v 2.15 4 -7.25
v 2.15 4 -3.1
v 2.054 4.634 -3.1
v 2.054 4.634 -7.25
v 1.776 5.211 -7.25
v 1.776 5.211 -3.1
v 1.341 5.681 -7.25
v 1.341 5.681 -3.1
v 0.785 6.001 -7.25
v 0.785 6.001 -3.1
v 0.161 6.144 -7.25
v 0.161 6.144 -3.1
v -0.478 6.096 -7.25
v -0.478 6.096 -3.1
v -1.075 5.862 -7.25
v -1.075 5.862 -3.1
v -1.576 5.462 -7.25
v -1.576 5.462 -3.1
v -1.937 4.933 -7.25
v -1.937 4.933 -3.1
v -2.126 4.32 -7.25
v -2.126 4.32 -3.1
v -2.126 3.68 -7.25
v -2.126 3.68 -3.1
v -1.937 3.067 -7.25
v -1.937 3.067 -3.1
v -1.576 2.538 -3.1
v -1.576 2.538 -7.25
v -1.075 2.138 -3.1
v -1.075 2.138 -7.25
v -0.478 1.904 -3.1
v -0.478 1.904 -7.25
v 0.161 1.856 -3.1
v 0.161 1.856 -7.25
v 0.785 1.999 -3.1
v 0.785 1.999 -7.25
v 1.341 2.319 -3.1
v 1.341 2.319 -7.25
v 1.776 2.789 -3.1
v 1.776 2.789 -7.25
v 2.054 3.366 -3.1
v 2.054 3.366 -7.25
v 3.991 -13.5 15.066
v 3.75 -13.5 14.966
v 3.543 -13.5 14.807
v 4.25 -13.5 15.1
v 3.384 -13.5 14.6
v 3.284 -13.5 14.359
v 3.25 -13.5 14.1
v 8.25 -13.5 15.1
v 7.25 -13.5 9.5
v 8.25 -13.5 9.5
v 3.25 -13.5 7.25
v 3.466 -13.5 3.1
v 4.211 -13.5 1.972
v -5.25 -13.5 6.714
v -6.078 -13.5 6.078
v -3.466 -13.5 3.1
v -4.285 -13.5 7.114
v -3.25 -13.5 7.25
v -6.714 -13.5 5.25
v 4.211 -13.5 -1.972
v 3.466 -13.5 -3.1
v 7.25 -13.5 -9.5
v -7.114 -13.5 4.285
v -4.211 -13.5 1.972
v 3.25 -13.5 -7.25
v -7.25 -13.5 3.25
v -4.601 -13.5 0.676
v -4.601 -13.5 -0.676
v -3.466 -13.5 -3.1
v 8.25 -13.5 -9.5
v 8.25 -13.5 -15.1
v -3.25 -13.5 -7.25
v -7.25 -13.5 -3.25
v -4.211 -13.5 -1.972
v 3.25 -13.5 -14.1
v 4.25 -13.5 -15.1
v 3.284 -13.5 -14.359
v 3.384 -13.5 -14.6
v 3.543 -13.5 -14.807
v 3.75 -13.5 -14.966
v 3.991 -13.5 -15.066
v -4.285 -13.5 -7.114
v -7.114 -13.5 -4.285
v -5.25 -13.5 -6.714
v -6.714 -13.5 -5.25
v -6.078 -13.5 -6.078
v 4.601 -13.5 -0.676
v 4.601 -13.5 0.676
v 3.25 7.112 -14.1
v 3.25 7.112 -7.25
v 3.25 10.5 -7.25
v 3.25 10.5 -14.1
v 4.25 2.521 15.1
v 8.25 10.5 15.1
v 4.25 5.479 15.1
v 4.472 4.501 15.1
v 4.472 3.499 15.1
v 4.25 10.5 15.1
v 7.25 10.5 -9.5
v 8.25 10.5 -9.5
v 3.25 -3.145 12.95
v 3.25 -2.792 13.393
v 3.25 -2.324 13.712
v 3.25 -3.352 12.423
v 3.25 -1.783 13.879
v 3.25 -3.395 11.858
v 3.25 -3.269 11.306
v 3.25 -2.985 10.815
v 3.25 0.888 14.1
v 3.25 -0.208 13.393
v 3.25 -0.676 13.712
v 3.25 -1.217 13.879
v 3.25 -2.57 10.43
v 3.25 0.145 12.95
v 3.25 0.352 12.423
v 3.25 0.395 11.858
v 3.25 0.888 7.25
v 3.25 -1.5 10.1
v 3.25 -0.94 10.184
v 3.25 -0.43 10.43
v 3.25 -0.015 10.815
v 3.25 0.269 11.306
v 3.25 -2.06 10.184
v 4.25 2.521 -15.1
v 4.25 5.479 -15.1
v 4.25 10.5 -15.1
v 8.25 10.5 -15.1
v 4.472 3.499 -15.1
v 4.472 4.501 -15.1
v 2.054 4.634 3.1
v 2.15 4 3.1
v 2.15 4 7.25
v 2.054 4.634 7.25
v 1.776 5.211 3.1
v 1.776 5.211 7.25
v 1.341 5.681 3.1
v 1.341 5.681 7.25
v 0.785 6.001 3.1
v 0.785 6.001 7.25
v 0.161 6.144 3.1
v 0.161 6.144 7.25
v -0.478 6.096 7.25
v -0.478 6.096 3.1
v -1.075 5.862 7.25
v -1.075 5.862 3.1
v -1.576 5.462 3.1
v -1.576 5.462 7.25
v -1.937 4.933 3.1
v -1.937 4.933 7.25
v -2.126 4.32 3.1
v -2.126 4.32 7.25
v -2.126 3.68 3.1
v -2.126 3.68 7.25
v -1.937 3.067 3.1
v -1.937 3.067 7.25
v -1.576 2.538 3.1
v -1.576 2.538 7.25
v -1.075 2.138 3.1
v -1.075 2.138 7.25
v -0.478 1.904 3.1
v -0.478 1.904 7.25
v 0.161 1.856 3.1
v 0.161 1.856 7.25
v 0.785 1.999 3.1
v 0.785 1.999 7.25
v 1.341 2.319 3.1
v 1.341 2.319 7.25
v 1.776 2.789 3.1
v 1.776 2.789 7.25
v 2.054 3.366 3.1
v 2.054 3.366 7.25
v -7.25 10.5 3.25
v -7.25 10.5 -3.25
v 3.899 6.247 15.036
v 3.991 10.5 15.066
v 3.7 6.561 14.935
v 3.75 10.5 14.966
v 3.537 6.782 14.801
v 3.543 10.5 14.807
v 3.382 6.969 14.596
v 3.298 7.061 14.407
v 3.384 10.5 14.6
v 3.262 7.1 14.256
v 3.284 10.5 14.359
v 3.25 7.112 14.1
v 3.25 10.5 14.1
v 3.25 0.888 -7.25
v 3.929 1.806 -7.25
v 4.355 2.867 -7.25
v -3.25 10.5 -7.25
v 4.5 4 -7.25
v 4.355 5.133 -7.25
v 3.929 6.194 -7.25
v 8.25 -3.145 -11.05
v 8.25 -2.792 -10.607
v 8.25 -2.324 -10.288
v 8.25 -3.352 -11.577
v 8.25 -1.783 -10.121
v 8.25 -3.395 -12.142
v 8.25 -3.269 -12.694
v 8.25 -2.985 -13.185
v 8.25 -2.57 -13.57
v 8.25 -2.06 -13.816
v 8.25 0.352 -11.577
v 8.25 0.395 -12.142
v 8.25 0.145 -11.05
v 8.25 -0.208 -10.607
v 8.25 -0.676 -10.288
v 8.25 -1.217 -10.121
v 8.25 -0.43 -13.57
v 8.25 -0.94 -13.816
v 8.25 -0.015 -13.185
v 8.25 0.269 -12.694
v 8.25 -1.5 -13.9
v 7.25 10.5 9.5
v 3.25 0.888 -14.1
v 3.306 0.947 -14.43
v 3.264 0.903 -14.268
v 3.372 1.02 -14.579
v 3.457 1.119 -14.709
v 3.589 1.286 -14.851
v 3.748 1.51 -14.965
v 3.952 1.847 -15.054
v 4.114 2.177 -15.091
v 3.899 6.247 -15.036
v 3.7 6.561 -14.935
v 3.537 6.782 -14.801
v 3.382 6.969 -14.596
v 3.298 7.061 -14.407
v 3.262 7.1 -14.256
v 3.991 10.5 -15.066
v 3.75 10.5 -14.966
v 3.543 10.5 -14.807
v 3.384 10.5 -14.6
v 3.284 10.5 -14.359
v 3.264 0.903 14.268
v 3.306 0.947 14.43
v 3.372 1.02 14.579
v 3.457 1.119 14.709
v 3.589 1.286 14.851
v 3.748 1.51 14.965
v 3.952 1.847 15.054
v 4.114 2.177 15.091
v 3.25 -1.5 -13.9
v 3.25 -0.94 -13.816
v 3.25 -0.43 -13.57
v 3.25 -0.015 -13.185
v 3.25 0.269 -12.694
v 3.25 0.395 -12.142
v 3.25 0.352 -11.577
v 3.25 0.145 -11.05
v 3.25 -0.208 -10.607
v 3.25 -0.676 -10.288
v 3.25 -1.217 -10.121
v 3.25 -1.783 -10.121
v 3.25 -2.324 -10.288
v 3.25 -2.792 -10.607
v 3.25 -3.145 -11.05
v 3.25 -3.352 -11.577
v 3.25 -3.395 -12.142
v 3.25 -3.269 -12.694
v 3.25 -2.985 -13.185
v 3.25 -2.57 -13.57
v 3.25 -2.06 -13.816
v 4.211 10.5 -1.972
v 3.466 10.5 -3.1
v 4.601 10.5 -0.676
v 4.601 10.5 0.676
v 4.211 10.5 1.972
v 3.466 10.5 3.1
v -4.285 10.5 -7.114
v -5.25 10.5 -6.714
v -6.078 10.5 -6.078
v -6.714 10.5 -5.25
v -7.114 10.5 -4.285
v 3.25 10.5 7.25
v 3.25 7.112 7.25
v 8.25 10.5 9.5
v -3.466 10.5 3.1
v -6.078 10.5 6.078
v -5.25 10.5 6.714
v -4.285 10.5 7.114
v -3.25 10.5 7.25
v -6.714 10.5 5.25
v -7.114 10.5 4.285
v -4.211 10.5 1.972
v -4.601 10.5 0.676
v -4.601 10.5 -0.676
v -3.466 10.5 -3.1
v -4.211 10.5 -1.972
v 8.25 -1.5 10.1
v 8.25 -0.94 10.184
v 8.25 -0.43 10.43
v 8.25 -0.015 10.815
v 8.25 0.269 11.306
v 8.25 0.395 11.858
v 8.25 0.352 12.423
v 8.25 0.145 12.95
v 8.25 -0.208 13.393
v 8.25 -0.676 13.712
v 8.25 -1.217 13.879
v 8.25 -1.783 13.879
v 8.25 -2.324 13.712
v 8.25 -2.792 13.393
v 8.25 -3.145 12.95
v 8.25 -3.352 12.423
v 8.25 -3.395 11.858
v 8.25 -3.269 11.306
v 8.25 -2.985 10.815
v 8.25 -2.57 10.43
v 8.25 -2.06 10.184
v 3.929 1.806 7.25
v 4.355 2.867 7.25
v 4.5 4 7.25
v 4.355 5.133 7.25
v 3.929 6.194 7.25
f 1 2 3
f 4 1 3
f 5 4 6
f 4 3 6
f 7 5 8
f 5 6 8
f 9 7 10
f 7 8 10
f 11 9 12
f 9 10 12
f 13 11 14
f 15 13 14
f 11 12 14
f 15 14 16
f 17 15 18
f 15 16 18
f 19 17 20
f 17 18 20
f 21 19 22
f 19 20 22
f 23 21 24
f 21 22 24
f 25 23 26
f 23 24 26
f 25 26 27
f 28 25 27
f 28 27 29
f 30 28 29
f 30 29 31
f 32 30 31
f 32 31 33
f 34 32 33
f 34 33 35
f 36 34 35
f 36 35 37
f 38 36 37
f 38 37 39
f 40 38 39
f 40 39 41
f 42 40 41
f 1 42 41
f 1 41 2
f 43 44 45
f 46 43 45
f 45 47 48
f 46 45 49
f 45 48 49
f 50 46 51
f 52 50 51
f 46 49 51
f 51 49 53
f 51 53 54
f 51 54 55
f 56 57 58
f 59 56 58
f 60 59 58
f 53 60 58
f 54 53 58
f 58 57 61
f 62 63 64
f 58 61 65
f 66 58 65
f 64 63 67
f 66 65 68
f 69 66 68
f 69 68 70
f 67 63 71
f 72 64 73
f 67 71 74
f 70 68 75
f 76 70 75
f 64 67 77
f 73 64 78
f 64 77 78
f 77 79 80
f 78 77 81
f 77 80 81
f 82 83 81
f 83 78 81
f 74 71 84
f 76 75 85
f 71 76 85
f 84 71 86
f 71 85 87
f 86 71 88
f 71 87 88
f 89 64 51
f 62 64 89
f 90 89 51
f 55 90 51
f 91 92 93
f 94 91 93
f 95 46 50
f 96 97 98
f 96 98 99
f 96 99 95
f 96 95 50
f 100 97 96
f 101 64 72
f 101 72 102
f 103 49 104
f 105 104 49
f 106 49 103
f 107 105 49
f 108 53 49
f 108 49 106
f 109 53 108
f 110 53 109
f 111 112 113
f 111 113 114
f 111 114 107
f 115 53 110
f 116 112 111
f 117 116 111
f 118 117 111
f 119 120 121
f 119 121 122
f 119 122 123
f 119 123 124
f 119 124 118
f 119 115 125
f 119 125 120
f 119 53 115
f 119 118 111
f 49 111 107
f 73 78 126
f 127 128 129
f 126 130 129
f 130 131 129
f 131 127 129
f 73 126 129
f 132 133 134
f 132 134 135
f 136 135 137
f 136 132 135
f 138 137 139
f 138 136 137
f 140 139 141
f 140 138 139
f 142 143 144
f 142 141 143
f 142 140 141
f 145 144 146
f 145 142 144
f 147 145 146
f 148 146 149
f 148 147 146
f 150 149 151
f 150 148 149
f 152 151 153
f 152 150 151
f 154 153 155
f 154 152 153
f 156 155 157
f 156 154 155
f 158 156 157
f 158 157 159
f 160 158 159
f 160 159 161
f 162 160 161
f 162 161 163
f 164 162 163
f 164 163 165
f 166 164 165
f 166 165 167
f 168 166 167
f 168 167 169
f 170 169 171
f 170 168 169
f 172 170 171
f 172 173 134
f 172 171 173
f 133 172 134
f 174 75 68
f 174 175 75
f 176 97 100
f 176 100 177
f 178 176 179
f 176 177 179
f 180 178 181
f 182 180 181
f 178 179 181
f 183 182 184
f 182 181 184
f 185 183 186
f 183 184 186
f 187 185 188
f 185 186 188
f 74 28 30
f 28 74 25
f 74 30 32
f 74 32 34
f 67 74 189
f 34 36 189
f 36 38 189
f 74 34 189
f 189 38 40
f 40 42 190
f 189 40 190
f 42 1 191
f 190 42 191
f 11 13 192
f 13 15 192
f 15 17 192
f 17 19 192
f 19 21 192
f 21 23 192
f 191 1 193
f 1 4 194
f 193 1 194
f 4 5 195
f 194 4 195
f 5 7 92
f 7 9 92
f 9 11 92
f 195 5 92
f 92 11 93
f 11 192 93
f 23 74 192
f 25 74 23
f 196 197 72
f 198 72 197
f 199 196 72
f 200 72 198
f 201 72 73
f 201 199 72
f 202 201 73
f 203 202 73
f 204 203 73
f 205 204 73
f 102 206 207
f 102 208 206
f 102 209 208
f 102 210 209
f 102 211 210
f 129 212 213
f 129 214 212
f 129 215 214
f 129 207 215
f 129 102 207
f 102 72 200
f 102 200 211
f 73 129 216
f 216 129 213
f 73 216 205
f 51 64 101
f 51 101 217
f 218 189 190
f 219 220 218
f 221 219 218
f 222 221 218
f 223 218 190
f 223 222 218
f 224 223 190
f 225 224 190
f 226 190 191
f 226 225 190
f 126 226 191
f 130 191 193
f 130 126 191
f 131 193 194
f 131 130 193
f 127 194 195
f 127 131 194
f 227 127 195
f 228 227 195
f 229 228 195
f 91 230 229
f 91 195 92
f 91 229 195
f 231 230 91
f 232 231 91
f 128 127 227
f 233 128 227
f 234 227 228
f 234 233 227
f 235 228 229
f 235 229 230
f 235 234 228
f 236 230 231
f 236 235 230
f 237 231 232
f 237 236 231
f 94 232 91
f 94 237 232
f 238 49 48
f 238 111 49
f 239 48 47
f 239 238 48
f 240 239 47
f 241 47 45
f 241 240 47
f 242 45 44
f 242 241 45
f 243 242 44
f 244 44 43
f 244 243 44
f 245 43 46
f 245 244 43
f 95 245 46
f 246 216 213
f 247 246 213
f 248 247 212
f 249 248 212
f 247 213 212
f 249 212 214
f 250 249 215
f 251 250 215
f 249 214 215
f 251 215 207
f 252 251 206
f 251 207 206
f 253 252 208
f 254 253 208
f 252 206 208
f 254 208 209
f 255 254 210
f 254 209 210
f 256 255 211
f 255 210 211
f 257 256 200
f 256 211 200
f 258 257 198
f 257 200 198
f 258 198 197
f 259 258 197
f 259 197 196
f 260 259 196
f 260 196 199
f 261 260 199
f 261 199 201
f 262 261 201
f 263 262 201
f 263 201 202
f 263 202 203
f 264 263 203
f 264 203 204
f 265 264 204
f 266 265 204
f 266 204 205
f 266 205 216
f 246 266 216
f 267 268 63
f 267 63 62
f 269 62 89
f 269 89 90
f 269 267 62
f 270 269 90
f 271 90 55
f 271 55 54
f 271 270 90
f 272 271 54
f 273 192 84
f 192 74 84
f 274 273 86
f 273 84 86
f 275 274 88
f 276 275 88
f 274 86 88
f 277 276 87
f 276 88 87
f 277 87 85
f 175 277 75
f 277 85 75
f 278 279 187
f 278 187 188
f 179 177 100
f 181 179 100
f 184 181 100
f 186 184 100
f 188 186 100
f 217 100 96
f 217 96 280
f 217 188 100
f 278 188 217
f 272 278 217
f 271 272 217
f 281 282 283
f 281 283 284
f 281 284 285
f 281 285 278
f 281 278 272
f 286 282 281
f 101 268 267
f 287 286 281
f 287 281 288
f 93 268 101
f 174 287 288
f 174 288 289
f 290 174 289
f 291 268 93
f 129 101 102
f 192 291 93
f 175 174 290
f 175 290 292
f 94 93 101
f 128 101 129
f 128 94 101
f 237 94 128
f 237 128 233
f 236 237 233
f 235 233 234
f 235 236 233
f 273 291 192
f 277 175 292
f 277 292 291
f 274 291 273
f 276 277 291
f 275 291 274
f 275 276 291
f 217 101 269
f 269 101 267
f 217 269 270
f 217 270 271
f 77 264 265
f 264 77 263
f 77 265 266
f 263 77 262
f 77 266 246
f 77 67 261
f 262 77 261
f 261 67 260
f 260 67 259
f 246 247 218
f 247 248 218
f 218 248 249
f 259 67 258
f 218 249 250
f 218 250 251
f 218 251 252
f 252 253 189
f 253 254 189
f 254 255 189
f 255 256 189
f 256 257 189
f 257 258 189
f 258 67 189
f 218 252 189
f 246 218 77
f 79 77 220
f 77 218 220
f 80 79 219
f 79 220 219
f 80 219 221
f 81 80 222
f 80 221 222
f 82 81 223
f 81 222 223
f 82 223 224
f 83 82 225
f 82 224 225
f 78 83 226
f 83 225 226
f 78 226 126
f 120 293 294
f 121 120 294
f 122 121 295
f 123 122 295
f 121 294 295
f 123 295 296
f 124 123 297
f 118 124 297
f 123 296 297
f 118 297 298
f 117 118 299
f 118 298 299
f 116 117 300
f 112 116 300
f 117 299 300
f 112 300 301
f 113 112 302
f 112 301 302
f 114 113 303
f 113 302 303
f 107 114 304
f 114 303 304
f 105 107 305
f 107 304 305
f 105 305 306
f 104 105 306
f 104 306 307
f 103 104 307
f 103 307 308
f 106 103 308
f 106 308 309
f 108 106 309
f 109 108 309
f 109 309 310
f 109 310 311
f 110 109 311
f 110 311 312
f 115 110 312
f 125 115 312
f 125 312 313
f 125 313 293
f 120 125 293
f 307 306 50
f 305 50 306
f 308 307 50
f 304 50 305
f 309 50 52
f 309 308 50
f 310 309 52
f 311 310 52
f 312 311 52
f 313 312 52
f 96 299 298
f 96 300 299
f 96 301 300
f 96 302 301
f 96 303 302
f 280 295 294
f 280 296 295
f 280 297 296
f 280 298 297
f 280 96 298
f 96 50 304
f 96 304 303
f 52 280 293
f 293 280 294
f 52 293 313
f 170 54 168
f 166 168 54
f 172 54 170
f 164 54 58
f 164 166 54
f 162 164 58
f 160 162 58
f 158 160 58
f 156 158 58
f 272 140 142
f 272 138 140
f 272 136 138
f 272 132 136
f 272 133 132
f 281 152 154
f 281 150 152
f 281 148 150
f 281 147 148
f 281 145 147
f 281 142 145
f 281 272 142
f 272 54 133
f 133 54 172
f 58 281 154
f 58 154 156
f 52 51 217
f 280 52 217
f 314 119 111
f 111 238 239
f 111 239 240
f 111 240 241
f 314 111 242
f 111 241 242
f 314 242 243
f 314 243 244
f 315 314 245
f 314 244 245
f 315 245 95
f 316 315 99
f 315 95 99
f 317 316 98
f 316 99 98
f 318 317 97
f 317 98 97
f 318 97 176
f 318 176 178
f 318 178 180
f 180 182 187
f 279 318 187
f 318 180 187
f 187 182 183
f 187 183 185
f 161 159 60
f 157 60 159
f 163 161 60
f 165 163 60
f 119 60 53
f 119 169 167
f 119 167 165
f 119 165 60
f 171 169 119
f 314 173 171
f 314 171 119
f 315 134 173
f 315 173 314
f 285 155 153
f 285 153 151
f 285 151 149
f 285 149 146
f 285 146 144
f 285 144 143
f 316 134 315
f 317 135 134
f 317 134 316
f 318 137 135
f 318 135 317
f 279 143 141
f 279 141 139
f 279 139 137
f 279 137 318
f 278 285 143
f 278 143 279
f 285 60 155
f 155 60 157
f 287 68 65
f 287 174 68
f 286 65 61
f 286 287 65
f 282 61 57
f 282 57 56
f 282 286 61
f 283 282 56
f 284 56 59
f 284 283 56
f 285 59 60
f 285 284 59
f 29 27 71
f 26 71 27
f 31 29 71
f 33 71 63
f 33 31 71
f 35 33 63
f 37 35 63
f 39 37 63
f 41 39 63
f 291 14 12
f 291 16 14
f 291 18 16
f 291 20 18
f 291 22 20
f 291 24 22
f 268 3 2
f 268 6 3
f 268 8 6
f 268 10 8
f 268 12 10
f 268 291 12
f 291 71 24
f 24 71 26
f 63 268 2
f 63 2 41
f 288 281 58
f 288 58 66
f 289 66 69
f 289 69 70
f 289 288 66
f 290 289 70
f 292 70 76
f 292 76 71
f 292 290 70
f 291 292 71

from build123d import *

# Parameters (mm, degrees)
SKETCH_1_W               = 14.5
SKETCH_1_H               = 14.5
EXTRUDE_1_DEPTH          = 10.5
SKETCH_4_R               = 2.15
CUT_EXTRUDE_2_DEPTH      = 8.25
CUT_EXTRUDE_2_DEPTH_BACK = 8.25
SKETCH_6_W               = 14.5
SKETCH_6_H               = 14.5
EXTRUDE_2_DEPTH          = 13.5
SKETCH_9_W               = 4
SKETCH_9_H               = 24
EXTRUDE_3_DEPTH          = 12
SKETCH_10_W              = 5.6
SKETCH_10_H              = 24
EXTRUDE_4_DEPTH          = 1
SKETCH_11_R              = 4.5
CUT_EXTRUDE_3_DEPTH      = 7.85
SKETCH_12_R              = 1.9
CUT_EXTRUDE_4_DEPTH      = 1
CUT_EXTRUDE_4_DEPTH_BACK = 16.5
FILLET_1_R               = 4
FILLET_3_R               = 1


with BuildPart() as part:
    # 草图1 → 凸台-拉伸1 (new body)
    with BuildSketch(Plane(origin=(0, 0, 0), x_dir=(1, 0, 0), z_dir=(0, 1, 0))):
        Rectangle(SKETCH_1_W, SKETCH_1_H)
        with BuildLine():
            Line((3.465905365, -3.1), (-3.465905365, -3.1))
            ThreePointArc((-3.465905365, -3.1), (-4.65, 0), (-3.465905365, 3.1))
            Line((-3.465905365, 3.1), (3.465905365, 3.1))
            ThreePointArc((3.465905365, 3.1), (4.65, 0), (3.465905365, -3.1))
        make_face(mode=Mode.SUBTRACT)
    extrude(amount=EXTRUDE_1_DEPTH)

    # 草图4 → 切除-拉伸2 (cut, two sides)
    with BuildSketch(Plane.XY) as cut_extrude_2_sk:
        with Locations((0, 4)):
            Circle(SKETCH_4_R)
    extrude(amount=CUT_EXTRUDE_2_DEPTH, mode=Mode.SUBTRACT)
    extrude(cut_extrude_2_sk.sketch, amount=-CUT_EXTRUDE_2_DEPTH_BACK, mode=Mode.SUBTRACT)

    # 草图6 → 凸台-拉伸2 (add)
    with BuildSketch(Plane.XZ):
        Rectangle(SKETCH_6_W, SKETCH_6_H)
        with BuildLine():
            Line((-3.465905365, -3.1), (3.465905365, -3.1))
            ThreePointArc((3.465905365, -3.1), (4.65, 0), (3.465905365, 3.1))
            Line((3.465905365, 3.1), (-3.465905365, 3.1))
            ThreePointArc((-3.465905365, 3.1), (-4.65, 0), (-3.465905365, -3.1))
        make_face(mode=Mode.SUBTRACT)
    extrude(amount=EXTRUDE_2_DEPTH)

    # 草图9 → 凸台-拉伸3 (add)
    with BuildSketch(Plane.XY.offset(-3.1)):
        with Locations((5.25, -1.5)):
            Rectangle(SKETCH_9_W, SKETCH_9_H)
    extrude_3 = extrude(amount=-EXTRUDE_3_DEPTH)

    # 镜向1: 凸台-拉伸3 across plane
    add(extrude_3.mirror(Plane.XY))

    # 草图10 → 凸台-拉伸4 (add)
    with BuildSketch(Plane(origin=(7.25, 0, 0), x_dir=(0, 0, -1), z_dir=(1, 0, 0))):
        with Locations((-12.3, -1.5)):
            Rectangle(SKETCH_10_W, SKETCH_10_H)
        with Locations((12.3, -1.5)):
            Rectangle(SKETCH_10_W, SKETCH_10_H)
    extrude(amount=EXTRUDE_4_DEPTH)

    # 草图11 → 切除-拉伸3 (cut)
    with BuildSketch(Plane.XY.offset(15.1)):
        with Locations((0, 4)):
            Circle(SKETCH_11_R)
    cut_extrude_3 = extrude(amount=-CUT_EXTRUDE_3_DEPTH, mode=Mode.SUBTRACT)

    # 镜向2: 切除-拉伸3 across plane
    add(cut_extrude_3.mirror(Plane.XY), mode=Mode.SUBTRACT)

    # 草图12 → 切除-拉伸4 (cut, two sides)
    with BuildSketch(Plane(origin=(8.25, 0, 0), x_dir=(0, 0, -1), z_dir=(1, 0, 0))) as cut_extrude_4_sk:
        with Locations((12, -1.5)):
            Circle(SKETCH_12_R)
        with Locations((-12, -1.5)):
            Circle(SKETCH_12_R)
    extrude(amount=CUT_EXTRUDE_4_DEPTH, mode=Mode.SUBTRACT)
    extrude(cut_extrude_4_sk.sketch, amount=-CUT_EXTRUDE_4_DEPTH_BACK, mode=Mode.SUBTRACT)

    # 圆角1
    fillet_1_edges = [part.edges().sort_by_distance(p)[0] for p in [
        (-7.25, -1.5, 7.25),
        (-7.25, -1.5, -7.25),
    ]]
    fillet(fillet_1_edges, radius=FILLET_1_R)

    # 圆角3
    fillet_3_edges = [part.edges().sort_by_distance(p)[0] for p in [
        (3.25, -6.30623745, 15.1),
        (3.25, -6.30623745, -15.1),
        (3.25, 8.80623745, -15.1),
        (3.25, 8.80623745, 15.1),
    ]]
    fillet(fillet_3_edges, radius=FILLET_3_R)


solid = part.part
